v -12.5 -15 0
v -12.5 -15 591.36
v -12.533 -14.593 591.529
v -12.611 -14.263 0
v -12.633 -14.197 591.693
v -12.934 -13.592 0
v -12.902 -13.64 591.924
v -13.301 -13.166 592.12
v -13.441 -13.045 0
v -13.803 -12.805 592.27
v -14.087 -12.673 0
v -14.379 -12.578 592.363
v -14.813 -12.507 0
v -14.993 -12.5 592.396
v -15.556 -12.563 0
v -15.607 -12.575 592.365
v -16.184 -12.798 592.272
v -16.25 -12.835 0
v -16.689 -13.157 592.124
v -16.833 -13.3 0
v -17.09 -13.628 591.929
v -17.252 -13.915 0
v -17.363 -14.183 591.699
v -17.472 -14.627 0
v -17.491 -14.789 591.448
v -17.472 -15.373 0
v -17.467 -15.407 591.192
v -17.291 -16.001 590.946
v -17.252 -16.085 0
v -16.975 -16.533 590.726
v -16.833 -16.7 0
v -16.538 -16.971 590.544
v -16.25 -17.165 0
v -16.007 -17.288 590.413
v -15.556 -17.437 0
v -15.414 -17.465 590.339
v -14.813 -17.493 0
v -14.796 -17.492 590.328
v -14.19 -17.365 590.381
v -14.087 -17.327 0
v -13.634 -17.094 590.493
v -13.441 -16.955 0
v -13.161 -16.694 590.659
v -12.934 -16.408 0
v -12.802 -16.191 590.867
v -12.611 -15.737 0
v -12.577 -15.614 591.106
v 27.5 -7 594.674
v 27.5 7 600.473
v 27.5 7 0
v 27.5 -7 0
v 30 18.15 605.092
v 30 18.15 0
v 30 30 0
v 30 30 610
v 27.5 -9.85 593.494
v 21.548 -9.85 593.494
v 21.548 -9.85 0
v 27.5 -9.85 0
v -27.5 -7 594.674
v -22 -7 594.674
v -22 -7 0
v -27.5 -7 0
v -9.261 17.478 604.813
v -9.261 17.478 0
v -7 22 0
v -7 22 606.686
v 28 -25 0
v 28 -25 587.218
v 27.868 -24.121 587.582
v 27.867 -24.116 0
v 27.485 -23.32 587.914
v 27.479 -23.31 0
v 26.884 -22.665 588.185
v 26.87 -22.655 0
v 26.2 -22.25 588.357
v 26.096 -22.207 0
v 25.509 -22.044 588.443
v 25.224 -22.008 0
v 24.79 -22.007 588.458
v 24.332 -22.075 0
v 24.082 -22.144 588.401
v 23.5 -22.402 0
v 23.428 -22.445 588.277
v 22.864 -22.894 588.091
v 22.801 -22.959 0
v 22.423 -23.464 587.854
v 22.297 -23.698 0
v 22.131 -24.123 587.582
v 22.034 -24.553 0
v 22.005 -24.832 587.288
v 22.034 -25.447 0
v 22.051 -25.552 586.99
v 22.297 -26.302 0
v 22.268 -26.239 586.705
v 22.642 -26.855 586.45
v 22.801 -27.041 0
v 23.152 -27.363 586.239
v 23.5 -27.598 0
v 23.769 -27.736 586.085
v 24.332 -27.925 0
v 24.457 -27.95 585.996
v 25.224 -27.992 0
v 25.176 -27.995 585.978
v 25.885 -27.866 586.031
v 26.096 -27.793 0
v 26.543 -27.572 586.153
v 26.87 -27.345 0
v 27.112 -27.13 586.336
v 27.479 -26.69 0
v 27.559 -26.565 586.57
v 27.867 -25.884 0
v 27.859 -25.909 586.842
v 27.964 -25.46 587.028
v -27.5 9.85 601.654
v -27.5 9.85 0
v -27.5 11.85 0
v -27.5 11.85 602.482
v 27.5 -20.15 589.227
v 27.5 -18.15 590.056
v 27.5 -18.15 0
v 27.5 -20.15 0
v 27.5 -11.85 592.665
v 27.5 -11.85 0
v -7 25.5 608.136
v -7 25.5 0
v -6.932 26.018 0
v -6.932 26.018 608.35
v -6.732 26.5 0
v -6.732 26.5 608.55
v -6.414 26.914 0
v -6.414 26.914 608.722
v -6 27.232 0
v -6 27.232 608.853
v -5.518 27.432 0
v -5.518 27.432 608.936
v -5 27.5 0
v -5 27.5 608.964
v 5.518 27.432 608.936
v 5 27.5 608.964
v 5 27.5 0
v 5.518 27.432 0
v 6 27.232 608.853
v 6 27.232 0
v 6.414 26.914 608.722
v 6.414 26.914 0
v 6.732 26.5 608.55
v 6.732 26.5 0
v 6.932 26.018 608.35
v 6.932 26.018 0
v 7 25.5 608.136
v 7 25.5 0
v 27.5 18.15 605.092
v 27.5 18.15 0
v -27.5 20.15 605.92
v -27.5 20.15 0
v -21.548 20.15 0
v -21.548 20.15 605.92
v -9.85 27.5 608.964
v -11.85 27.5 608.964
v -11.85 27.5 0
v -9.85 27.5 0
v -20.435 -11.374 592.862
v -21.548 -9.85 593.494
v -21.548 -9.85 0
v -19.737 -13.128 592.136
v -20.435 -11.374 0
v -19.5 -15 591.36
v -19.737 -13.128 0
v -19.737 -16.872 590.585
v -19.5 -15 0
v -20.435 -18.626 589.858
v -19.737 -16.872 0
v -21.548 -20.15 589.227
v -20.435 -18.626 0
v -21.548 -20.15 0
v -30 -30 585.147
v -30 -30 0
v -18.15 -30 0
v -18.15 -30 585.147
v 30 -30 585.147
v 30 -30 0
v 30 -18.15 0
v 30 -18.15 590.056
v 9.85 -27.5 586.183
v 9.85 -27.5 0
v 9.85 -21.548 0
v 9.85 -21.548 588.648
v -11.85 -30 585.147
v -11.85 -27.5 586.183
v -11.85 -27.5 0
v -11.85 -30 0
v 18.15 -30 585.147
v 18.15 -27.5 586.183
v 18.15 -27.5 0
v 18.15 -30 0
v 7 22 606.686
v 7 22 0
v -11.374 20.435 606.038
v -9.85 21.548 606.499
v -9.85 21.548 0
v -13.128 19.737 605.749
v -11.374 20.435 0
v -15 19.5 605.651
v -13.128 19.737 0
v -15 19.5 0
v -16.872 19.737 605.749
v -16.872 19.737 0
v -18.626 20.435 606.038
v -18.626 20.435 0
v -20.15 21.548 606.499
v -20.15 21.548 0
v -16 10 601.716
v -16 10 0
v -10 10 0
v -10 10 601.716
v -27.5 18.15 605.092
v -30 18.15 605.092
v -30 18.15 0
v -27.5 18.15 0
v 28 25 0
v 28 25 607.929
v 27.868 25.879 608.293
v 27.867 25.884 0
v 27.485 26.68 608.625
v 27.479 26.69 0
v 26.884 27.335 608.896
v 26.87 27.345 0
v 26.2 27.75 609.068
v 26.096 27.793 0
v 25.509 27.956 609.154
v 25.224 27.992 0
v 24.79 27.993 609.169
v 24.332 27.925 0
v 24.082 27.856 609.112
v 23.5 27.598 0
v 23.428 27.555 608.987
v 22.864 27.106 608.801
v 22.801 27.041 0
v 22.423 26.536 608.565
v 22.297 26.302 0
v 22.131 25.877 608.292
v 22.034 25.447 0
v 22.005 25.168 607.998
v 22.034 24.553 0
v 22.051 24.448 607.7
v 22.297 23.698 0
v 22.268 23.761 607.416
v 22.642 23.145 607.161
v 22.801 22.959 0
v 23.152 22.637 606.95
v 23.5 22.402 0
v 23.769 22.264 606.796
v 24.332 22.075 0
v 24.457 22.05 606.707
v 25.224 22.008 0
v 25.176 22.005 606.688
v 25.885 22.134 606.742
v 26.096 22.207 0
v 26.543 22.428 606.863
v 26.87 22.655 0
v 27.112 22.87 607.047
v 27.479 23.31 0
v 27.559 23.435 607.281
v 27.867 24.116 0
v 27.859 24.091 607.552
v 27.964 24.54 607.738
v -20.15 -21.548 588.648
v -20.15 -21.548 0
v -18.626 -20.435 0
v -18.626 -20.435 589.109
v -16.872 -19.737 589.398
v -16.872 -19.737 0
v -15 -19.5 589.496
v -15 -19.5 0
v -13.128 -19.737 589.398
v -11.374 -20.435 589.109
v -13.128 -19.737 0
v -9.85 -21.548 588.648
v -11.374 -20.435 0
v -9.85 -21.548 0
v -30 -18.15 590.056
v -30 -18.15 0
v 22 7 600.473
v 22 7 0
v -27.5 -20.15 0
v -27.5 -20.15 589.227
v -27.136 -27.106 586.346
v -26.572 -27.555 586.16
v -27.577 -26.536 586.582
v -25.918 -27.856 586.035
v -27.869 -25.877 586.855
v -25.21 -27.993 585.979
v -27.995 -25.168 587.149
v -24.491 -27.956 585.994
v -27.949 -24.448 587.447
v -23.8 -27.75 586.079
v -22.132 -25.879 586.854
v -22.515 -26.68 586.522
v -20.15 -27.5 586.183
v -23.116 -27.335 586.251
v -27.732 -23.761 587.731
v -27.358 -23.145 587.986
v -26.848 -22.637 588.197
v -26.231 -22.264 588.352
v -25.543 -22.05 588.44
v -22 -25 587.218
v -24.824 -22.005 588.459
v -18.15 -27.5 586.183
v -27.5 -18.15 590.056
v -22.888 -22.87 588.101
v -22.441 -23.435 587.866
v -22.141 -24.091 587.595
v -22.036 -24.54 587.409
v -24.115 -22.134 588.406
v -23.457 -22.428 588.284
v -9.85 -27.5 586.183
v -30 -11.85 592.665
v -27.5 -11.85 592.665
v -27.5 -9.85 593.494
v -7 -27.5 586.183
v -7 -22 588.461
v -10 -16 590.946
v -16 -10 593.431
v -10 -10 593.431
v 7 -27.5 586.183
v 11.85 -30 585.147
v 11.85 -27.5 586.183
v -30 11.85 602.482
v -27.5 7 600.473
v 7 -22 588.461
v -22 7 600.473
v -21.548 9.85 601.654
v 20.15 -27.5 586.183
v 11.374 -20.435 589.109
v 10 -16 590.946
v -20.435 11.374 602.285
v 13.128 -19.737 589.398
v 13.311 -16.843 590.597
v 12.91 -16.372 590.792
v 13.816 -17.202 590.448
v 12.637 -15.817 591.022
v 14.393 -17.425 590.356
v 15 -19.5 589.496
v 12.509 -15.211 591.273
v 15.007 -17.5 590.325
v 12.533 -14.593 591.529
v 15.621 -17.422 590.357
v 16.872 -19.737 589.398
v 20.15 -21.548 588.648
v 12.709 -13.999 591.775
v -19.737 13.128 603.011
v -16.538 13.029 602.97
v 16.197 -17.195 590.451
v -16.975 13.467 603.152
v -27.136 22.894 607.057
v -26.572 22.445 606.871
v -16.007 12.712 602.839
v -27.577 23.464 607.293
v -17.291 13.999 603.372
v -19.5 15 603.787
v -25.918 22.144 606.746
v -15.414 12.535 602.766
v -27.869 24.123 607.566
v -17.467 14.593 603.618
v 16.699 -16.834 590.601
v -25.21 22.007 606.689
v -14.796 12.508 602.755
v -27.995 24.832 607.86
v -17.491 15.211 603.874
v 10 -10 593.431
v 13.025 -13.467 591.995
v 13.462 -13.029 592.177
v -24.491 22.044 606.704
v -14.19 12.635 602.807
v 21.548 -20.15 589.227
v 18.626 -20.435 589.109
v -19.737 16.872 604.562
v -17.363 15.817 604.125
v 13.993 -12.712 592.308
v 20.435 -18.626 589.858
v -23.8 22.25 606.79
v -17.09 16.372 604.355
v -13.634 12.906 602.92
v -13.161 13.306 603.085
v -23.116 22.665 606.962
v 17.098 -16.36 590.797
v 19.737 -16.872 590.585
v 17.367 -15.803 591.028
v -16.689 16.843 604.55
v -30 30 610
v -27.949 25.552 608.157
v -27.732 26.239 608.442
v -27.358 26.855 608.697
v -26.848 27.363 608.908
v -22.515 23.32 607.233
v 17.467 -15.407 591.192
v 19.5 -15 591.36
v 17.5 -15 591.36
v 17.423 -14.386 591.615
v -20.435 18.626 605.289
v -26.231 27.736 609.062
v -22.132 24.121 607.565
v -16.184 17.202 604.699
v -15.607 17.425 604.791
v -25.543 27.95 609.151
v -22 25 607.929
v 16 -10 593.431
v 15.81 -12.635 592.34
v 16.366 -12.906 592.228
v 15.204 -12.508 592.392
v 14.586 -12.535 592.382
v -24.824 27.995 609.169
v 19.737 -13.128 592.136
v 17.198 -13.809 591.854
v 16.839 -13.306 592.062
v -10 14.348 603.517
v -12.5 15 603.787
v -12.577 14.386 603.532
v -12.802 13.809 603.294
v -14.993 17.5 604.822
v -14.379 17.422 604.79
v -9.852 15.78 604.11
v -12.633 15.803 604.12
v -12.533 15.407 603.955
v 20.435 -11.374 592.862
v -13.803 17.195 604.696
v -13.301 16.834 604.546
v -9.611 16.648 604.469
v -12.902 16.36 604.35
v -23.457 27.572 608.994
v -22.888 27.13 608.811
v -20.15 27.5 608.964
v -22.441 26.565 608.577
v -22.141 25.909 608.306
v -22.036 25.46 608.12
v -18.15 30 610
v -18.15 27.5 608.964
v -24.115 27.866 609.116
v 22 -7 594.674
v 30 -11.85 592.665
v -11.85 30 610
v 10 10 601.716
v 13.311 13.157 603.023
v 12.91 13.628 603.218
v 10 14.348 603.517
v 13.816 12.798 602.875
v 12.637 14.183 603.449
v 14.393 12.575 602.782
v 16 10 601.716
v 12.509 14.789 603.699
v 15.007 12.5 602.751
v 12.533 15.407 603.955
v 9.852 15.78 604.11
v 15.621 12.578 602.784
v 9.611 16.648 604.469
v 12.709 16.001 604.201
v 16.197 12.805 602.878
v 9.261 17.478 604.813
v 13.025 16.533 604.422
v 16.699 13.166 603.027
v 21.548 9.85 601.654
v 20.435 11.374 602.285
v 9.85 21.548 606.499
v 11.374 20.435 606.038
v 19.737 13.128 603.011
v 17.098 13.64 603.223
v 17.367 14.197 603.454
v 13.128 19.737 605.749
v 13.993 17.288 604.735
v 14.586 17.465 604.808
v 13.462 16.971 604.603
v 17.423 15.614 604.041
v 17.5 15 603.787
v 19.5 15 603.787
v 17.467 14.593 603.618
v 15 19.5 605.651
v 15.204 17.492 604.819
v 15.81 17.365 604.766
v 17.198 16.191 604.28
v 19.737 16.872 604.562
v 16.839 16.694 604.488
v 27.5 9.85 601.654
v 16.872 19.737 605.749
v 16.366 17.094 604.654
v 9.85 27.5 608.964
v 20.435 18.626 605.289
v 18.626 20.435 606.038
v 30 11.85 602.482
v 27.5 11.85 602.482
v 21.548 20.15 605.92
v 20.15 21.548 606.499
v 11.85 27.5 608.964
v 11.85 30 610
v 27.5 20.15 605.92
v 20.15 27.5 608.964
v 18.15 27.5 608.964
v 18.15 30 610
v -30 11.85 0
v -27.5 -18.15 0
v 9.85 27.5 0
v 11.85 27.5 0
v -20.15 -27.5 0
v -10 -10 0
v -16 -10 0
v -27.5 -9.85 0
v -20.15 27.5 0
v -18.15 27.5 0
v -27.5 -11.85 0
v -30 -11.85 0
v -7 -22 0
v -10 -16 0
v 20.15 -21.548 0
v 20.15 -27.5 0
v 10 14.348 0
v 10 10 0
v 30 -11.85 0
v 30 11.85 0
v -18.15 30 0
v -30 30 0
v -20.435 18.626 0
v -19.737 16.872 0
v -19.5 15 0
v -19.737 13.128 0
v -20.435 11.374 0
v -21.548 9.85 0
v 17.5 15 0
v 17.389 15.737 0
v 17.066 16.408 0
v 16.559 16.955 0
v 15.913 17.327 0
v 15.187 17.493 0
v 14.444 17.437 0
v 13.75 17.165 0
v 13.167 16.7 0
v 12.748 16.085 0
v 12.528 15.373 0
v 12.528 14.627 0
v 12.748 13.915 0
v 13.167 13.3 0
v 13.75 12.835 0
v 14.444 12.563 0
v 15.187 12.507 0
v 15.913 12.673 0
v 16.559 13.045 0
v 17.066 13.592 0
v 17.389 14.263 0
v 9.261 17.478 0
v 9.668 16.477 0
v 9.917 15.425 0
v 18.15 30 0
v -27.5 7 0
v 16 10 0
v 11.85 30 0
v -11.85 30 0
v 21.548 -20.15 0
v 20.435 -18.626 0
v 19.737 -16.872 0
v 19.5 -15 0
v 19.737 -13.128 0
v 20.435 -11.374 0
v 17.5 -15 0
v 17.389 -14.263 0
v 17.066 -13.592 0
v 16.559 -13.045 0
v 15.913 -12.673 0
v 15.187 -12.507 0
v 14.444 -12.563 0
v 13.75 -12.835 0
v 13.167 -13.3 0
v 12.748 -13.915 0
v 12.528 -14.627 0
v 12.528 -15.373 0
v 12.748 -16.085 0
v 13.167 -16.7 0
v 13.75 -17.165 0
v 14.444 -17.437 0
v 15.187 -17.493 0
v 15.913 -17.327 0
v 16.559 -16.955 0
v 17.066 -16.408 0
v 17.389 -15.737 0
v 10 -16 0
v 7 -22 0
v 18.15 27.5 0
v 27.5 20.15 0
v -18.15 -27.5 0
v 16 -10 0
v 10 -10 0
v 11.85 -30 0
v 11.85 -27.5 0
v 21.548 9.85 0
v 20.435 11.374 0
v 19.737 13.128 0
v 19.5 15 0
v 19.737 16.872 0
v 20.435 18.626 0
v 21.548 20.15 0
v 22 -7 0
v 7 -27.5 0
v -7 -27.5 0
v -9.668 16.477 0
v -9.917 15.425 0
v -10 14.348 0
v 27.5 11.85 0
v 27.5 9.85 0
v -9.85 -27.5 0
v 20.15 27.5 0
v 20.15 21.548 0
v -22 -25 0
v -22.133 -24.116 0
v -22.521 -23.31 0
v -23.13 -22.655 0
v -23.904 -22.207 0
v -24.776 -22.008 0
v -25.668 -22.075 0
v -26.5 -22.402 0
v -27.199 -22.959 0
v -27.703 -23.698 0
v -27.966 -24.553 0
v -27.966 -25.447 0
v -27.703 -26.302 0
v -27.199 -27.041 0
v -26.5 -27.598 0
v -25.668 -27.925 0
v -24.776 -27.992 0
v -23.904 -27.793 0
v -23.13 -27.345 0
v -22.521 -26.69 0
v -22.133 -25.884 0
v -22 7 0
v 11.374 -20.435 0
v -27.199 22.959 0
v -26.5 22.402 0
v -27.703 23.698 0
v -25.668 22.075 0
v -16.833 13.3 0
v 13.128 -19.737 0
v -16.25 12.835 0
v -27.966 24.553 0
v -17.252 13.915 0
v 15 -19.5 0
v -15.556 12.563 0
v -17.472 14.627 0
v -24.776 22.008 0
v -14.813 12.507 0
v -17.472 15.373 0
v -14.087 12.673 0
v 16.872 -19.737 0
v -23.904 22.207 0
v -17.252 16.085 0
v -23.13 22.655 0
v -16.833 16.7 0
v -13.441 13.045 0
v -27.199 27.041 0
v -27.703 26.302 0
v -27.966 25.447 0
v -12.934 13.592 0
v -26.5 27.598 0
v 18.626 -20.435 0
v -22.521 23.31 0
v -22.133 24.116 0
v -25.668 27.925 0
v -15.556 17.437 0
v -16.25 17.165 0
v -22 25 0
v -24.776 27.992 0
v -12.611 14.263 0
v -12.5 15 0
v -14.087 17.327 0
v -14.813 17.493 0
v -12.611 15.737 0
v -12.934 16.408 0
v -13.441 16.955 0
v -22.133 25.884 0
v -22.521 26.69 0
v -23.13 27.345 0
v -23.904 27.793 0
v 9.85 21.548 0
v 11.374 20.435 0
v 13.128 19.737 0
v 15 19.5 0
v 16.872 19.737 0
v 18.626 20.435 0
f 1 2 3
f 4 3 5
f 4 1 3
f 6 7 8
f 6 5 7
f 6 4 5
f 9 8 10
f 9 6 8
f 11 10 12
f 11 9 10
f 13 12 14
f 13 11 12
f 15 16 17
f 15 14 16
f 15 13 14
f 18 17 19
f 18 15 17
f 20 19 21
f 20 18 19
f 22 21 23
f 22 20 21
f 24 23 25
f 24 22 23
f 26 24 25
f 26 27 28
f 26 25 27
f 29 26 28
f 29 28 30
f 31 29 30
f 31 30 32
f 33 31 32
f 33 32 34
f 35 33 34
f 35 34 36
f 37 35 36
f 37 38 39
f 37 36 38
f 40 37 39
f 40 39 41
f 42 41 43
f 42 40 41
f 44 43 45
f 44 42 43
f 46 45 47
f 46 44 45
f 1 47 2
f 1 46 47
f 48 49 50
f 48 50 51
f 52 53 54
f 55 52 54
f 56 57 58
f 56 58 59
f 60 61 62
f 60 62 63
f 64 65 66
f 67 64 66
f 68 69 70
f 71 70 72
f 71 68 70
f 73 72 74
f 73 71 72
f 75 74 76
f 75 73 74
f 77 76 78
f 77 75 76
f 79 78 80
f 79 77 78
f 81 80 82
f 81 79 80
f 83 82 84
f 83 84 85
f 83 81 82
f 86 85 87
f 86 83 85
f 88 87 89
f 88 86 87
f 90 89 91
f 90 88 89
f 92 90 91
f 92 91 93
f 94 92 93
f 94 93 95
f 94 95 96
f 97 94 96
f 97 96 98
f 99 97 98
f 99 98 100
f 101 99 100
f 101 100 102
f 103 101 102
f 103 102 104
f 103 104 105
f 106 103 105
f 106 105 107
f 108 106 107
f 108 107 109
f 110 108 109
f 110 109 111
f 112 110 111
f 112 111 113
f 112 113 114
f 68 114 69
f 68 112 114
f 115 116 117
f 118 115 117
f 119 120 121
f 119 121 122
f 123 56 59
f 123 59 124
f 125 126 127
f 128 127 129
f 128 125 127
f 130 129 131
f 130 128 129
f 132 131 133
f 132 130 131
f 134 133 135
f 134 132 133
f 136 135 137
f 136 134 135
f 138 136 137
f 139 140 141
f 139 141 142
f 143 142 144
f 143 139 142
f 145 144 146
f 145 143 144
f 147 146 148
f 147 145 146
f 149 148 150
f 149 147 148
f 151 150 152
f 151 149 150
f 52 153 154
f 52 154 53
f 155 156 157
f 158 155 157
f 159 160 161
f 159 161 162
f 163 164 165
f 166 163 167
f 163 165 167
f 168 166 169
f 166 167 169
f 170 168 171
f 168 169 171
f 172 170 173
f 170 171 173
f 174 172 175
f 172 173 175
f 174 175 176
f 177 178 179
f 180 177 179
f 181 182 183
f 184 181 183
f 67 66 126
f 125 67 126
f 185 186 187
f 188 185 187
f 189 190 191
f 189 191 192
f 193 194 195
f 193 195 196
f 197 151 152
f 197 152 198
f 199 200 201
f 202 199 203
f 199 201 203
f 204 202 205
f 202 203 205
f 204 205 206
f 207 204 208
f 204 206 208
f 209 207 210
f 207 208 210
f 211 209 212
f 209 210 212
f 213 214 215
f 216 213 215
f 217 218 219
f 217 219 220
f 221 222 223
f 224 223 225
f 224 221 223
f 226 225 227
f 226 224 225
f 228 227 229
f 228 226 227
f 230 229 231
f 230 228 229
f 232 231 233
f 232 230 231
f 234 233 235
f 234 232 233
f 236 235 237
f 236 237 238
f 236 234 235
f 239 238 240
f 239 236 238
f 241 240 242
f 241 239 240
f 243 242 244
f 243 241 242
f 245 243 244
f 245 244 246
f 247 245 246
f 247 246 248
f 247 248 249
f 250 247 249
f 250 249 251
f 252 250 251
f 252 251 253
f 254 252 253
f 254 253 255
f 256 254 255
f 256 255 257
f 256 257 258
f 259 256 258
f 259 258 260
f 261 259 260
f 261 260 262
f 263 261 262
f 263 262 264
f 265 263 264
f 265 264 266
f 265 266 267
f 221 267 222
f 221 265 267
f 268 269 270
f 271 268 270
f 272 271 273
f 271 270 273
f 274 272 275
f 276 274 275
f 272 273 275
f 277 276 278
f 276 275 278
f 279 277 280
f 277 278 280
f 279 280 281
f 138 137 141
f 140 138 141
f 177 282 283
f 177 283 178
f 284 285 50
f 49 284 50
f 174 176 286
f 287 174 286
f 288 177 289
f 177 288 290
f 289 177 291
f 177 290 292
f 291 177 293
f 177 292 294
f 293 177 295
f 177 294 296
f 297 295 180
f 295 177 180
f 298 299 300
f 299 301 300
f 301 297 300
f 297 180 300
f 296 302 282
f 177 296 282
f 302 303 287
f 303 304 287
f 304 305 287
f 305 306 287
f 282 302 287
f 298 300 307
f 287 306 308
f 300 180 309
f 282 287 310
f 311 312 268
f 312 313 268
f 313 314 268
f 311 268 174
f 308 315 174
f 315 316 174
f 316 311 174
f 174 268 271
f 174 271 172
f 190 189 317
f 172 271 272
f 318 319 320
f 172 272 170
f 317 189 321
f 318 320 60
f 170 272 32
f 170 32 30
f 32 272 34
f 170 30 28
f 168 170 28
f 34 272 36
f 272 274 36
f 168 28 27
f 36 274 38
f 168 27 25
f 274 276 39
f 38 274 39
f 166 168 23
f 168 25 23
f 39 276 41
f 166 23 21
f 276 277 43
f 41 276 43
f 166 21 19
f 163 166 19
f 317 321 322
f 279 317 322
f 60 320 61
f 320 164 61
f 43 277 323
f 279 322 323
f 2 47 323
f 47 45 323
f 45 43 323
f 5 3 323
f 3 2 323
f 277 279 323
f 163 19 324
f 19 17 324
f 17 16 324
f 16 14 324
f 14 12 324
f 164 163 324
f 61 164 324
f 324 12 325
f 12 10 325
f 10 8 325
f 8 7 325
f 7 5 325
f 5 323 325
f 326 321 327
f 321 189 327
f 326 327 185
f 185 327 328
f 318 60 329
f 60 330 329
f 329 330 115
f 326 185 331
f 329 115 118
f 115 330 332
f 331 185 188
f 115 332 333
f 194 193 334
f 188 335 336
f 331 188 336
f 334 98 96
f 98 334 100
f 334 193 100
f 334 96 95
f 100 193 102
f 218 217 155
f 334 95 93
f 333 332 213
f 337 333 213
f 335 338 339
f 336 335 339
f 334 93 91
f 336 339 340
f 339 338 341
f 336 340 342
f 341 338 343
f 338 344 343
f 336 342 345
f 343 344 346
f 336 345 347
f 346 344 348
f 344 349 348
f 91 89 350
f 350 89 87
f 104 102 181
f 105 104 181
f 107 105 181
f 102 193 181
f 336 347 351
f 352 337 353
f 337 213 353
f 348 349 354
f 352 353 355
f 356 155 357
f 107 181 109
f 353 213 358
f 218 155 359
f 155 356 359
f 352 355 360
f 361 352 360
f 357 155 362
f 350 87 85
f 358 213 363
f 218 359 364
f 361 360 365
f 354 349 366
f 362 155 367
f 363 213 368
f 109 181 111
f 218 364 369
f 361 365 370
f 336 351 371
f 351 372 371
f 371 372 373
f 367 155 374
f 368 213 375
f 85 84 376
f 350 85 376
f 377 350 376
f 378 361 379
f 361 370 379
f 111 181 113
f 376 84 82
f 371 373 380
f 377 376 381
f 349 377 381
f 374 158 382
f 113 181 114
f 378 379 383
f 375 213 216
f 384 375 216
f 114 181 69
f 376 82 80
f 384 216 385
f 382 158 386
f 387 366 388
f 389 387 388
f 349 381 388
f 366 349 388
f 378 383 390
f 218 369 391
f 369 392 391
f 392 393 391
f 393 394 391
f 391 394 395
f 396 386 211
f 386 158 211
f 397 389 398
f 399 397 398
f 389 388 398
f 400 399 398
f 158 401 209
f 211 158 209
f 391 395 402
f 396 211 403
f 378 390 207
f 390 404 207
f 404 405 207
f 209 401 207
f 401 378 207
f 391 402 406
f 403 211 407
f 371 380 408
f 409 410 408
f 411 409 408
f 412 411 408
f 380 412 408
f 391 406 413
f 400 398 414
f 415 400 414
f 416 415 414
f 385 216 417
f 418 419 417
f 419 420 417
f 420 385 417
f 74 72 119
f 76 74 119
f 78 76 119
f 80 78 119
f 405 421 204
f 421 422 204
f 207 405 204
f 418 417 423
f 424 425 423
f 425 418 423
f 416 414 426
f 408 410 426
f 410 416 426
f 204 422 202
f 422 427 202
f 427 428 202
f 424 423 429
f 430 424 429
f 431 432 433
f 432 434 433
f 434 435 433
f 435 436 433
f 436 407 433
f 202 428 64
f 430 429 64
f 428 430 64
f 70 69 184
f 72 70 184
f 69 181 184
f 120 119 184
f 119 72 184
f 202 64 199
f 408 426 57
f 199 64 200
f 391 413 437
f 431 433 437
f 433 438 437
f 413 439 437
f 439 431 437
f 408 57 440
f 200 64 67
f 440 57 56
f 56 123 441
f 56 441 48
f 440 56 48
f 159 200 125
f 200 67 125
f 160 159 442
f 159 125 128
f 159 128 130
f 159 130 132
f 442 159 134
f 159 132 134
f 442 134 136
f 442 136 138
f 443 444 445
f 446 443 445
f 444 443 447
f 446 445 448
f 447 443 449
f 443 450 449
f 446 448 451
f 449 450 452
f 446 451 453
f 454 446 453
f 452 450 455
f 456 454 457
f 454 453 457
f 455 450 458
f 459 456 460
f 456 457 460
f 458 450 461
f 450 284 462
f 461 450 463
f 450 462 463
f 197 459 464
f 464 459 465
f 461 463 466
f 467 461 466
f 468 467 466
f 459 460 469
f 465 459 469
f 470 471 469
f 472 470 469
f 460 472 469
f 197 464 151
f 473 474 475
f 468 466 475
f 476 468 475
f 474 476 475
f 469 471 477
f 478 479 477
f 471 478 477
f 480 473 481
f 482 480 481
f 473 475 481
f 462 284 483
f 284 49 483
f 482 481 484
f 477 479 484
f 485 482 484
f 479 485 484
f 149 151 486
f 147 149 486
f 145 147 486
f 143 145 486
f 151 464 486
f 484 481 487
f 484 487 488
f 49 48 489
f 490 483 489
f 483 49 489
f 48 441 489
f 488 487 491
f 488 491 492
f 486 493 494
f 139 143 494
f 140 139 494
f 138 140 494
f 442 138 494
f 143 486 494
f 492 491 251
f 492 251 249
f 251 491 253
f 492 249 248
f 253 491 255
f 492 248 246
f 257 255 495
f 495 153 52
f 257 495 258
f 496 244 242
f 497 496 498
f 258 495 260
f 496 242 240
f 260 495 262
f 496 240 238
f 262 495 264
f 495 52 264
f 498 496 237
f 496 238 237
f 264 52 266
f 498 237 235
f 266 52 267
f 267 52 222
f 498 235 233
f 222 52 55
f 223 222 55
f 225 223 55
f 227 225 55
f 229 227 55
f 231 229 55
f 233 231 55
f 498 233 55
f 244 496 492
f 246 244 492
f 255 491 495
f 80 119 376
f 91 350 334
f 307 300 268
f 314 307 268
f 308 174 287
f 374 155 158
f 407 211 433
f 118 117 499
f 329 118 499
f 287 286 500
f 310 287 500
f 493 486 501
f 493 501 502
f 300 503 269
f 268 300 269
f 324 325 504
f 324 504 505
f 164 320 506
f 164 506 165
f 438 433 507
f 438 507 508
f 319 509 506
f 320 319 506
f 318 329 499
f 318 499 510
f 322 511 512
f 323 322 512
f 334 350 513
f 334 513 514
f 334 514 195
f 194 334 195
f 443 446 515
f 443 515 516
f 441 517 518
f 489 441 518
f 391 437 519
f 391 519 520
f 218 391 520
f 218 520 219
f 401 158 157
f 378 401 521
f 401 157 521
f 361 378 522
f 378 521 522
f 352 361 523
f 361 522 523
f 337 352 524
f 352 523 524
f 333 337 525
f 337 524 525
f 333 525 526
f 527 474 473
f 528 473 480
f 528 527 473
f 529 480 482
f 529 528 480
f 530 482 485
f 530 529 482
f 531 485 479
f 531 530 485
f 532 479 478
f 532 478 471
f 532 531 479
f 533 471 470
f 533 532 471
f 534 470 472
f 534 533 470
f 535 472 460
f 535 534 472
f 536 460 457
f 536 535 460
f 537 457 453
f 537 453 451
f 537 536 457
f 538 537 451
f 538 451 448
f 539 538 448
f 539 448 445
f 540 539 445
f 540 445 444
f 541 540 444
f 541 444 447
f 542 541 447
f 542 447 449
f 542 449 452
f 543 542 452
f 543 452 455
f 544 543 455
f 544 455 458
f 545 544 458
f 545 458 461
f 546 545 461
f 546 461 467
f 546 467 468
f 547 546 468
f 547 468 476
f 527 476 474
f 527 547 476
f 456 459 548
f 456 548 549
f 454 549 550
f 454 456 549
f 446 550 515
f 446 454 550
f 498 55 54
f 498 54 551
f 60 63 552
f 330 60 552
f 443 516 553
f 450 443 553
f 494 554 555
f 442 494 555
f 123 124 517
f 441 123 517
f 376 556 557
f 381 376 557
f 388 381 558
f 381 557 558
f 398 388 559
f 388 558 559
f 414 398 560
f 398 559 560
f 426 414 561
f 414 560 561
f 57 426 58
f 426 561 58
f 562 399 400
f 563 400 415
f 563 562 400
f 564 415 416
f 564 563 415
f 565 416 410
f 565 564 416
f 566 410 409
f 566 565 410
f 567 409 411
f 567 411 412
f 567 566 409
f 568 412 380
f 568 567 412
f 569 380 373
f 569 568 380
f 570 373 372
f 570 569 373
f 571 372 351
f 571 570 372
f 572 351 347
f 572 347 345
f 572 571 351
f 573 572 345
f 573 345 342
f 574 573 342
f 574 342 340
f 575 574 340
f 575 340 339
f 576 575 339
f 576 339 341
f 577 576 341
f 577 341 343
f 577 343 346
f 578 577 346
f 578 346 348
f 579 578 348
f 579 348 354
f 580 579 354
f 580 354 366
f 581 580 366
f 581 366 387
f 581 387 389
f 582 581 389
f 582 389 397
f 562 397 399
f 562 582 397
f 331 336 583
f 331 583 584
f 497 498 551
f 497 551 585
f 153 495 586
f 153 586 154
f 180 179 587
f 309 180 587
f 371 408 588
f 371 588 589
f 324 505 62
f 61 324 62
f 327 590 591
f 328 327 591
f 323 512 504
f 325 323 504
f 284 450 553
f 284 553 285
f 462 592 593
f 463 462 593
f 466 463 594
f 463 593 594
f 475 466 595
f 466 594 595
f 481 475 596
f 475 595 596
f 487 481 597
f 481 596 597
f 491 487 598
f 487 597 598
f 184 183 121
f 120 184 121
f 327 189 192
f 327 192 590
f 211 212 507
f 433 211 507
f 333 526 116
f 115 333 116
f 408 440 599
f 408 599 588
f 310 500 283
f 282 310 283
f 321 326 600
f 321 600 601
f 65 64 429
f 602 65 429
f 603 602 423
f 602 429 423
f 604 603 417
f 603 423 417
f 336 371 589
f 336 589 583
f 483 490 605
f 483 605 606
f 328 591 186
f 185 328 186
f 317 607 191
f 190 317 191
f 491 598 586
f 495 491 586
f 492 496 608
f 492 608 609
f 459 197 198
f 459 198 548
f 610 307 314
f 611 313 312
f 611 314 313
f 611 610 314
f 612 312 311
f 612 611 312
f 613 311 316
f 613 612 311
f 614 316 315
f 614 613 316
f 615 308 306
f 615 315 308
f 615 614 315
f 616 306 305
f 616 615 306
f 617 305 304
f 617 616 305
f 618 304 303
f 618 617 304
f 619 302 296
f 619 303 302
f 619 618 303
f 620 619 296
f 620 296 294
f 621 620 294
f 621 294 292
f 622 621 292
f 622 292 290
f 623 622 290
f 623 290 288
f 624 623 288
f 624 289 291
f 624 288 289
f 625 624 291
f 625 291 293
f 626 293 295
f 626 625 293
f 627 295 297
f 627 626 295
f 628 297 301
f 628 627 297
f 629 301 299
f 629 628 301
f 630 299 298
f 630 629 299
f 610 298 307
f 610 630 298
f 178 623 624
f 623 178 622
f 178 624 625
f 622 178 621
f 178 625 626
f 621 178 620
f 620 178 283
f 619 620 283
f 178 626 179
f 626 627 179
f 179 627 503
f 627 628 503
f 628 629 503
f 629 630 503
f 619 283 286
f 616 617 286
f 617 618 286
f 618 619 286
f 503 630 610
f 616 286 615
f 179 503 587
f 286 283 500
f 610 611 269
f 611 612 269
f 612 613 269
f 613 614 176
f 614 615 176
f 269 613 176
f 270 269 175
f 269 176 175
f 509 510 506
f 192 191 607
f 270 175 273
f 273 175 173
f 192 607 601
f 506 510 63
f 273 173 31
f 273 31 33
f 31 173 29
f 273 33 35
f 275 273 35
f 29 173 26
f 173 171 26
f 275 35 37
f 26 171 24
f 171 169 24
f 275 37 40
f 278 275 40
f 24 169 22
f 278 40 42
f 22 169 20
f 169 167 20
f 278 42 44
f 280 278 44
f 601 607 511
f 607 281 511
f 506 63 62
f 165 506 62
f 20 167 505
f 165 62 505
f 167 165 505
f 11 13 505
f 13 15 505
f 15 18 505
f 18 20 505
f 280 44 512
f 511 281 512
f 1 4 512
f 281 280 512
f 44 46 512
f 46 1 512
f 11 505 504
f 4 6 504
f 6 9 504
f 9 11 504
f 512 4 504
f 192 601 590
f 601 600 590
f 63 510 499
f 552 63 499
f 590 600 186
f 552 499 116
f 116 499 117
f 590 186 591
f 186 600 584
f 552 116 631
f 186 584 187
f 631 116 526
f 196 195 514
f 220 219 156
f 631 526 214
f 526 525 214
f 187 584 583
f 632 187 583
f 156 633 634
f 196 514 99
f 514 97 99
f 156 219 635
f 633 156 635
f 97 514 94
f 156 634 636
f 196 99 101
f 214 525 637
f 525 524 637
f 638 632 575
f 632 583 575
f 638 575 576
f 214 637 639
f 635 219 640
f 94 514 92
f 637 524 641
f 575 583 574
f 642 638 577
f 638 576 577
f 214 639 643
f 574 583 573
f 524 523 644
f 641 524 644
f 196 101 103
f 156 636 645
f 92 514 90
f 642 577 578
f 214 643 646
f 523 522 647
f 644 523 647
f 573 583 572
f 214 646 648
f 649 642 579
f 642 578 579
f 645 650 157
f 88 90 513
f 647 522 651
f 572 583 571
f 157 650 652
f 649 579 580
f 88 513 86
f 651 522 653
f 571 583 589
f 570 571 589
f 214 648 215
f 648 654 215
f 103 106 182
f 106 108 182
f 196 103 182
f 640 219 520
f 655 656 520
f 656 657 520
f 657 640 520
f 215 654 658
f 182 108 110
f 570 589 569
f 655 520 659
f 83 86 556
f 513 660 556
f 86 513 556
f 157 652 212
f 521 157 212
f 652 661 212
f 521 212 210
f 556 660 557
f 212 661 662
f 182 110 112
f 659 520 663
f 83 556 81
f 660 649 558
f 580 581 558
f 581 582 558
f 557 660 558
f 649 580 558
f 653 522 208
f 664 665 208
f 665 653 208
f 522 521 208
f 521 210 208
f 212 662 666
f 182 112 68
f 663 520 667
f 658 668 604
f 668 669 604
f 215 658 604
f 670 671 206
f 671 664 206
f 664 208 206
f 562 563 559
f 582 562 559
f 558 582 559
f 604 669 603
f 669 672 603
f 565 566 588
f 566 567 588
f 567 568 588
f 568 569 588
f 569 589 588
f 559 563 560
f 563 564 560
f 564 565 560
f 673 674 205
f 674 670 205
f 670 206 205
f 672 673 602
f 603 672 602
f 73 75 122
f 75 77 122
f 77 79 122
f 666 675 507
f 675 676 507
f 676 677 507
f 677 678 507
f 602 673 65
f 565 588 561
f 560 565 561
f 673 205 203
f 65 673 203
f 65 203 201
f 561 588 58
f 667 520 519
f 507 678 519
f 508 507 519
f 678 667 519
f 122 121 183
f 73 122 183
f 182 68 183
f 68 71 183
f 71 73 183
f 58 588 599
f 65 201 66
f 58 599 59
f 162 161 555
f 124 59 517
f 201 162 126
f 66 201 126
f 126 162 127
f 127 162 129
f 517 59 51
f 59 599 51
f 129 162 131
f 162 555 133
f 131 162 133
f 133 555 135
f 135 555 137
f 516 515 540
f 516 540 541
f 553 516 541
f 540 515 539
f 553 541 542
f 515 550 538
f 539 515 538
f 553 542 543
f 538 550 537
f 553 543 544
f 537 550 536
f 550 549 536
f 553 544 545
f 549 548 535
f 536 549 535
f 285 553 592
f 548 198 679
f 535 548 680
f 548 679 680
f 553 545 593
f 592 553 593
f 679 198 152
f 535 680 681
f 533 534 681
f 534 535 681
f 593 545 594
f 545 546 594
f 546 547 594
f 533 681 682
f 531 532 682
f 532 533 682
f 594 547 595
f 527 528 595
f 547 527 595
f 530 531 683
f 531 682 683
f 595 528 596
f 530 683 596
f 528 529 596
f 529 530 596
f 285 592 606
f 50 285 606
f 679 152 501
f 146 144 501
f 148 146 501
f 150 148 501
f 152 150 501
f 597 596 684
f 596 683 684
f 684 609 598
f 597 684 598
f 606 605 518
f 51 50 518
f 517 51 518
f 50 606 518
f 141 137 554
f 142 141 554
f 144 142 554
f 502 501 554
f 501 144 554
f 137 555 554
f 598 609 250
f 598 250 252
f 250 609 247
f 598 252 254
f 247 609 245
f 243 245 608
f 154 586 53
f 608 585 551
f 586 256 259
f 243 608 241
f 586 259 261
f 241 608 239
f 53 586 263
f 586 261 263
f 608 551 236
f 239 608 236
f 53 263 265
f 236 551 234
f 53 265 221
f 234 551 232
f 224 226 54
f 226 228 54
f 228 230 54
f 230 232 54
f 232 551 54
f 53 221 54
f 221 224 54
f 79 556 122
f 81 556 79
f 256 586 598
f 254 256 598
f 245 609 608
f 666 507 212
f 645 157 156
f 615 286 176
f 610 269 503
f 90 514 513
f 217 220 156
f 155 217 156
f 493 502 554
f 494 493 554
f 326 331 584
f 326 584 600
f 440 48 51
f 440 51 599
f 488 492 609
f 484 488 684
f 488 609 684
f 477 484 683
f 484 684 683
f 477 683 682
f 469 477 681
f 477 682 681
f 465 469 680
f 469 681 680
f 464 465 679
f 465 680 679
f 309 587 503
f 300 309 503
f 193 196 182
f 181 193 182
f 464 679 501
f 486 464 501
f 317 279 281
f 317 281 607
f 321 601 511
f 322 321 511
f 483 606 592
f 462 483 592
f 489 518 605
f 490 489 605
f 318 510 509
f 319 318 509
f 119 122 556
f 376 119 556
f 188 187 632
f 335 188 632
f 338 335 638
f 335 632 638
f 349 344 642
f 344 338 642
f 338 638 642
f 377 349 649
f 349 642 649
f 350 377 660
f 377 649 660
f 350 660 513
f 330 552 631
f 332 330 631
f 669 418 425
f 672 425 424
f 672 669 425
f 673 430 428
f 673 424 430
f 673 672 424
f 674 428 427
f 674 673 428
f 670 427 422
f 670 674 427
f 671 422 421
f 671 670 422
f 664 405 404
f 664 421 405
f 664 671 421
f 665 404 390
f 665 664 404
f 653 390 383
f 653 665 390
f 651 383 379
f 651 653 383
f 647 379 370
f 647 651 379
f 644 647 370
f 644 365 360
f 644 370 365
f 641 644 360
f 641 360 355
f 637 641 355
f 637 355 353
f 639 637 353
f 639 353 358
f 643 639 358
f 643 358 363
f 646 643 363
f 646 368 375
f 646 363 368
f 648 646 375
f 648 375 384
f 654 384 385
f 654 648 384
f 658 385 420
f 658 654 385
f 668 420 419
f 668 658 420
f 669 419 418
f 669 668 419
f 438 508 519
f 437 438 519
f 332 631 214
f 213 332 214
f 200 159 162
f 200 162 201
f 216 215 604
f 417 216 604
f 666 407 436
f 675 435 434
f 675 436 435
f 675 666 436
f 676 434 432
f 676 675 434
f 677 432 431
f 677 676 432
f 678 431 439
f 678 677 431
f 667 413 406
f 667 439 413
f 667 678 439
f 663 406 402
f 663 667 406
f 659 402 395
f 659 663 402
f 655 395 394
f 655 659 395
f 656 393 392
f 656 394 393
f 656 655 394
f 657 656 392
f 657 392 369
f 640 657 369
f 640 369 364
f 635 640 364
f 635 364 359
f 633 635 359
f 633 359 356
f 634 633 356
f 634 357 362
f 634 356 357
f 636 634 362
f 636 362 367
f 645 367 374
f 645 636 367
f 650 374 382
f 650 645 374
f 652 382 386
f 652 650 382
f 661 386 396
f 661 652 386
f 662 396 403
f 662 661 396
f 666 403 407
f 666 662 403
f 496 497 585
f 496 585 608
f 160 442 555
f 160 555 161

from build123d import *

# Parameters (mm, degrees)
F0_R          = 3
F0_R_2        = 2.5
F1_DEPTH      = 610
F2_R          = 2
F3_R          = 7
F5_DEPTH      = 30
F5_DEPTH_BACK = 30


# Not quite as in the source:
# - a feature names something its author has since deleted; it is built from what else it names


with BuildPart() as f1:
    # F0 (on Top) → F1 (new body)
    with BuildSketch(Plane.XY):
        with BuildLine():
            Line((18.15, -30), (30, -30))
            Line((30, -30), (30, -18.15))
            Line((30, -18.15), (27.5, -18.15))
            Line((27.5, -18.15), (27.5, -20.15))
            Line((27.5, -20.15), (21.5477069044, -20.15))
            ThreePointArc((21.5477069044, -20.15), (19.5, -15), (21.5477069044, -9.85))
            Line((21.5477069044, -9.85), (27.5, -9.85))
            Line((27.5, -9.85), (27.5, -11.85))
            Line((27.5, -11.85), (30, -11.85))
            Line((30, -11.85), (30, 11.85))
            Line((30, 11.85), (27.5, 11.85))
            Line((27.5, 11.85), (27.5, 9.85))
            Line((27.5, 9.85), (21.5477069044, 9.85))
            ThreePointArc((21.5477069044, 9.85), (19.5, 15), (21.5477069044, 20.15))
            Line((21.5477069044, 20.15), (27.5, 20.15))
            Line((27.5, 20.15), (27.5, 18.15))
            Line((27.5, 18.15), (30, 18.15))
            Line((30, 18.15), (30, 30))
            Line((30, 30), (18.15, 30))
            Line((18.15, 30), (18.15, 27.5))
            Line((18.15, 27.5), (20.15, 27.5))
            Line((20.15, 27.5), (20.15, 21.5477069044))
            ThreePointArc((20.15, 21.5477069044), (15, 19.5), (9.85, 21.5477069044))
            Line((9.85, 21.5477069044), (9.85, 27.5))
            Line((9.85, 27.5), (11.85, 27.5))
            Line((11.85, 27.5), (11.85, 30))
            Line((11.85, 30), (-11.85, 30))
            Line((-11.85, 30), (-11.85, 27.5))
            Line((-11.85, 27.5), (-9.85, 27.5))
            Line((-9.85, 27.5), (-9.85, 21.5477069044))
            ThreePointArc((-9.85, 21.5477069044), (-15, 19.5), (-20.15, 21.5477069044))
            Line((-20.15, 21.5477069044), (-20.15, 27.5))
            Line((-20.15, 27.5), (-18.15, 27.5))
            Line((-18.15, 27.5), (-18.15, 30))
            Line((-18.15, 30), (-30, 30))
            Line((-30, 30), (-30, 18.15))
            Line((-30, 18.15), (-27.5, 18.15))
            Line((-27.5, 18.15), (-27.5, 20.15))
            Line((-27.5, 20.15), (-21.5477069044, 20.15))
            ThreePointArc((-21.5477069044, 20.15), (-19.5, 15), (-21.5477069044, 9.85))
            Line((-21.5477069044, 9.85), (-27.5, 9.85))
            Line((-27.5, 9.85), (-27.5, 11.85))
            Line((-27.5, 11.85), (-30, 11.85))
            Line((-30, 11.85), (-30, -11.85))
            Line((-30, -11.85), (-27.5, -11.85))
            Line((-27.5, -11.85), (-27.5, -9.85))
            Line((-27.5, -9.85), (-21.5477069044, -9.85))
            ThreePointArc((-21.5477069044, -9.85), (-19.5, -15), (-21.5477069044, -20.15))
            Line((-21.5477069044, -20.15), (-27.5, -20.15))
            Line((-27.5, -20.15), (-27.5, -18.15))
            Line((-27.5, -18.15), (-30, -18.15))
            Line((-30, -18.15), (-30, -30))
            Line((-30, -30), (-18.15, -30))
            Line((-18.15, -30), (-18.15, -27.5))
            Line((-18.15, -27.5), (-20.15, -27.5))
            Line((-20.15, -27.5), (-20.15, -21.5477069044))
            ThreePointArc((-20.15, -21.5477069044), (-15, -19.5), (-9.85, -21.5477069044))
            Line((-9.85, -21.5477069044), (-9.85, -27.5))
            Line((-9.85, -27.5), (-11.85, -27.5))
            Line((-11.85, -27.5), (-11.85, -30))
            Line((-11.85, -30), (11.85, -30))
            Line((11.85, -30), (11.85, -27.5))
            Line((11.85, -27.5), (9.85, -27.5))
            Line((9.85, -27.5), (9.85, -21.5477069044))
            ThreePointArc((9.85, -21.5477069044), (15, -19.5), (20.15, -21.5477069044))
            Line((20.15, -21.5477069044), (20.15, -27.5))
            Line((20.15, -27.5), (18.15, -27.5))
            Line((18.15, -27.5), (18.15, -30))
        make_face()
        with Locations((-25, -25)):
            Circle(F0_R, mode=Mode.SUBTRACT)
        with Locations((-15, -15)):
            Circle(F0_R_2, mode=Mode.SUBTRACT)
        with Locations((25, -25)):
            Circle(F0_R, mode=Mode.SUBTRACT)
        with Locations((15, -15)):
            Circle(F0_R_2, mode=Mode.SUBTRACT)
        with Locations((-25, 25)):
            Circle(F0_R, mode=Mode.SUBTRACT)
        with Locations((-15, 15)):
            Circle(F0_R_2, mode=Mode.SUBTRACT)
        Polygon((-7, 22), (-7, 27.5), (0, 27.5), (7, 27.5), (7, 22), (10, 16), (10, 10), (16, 10), (22, 7), (27.5, 7), (27.5, 0), (27.5, -7), (22, -7), (16, -10), (10, -10), (10, -16), (7, -22), (7, -27.5), (0, -27.5), (-7, -27.5), (-7, -22), (-10, -16), (-10, -10), (-16, -10), (-22, -7), (-27.5, -7), (-27.5, 0), (-27.5, 7), (-22, 7), (-16, 10), (-10, 10), (-10, 16), align=None, mode=Mode.SUBTRACT)
        with Locations((15, 15)):
            Circle(F0_R_2, mode=Mode.SUBTRACT)
        with Locations((25, 25)):
            Circle(F0_R, mode=Mode.SUBTRACT)
    extrude(amount=F1_DEPTH)

    # F2
    f2_edges = [f1.edges().sort_by_distance(p)[0] for p in [
        (-7, 27.5, 305),
        (7, 27.5, 305),
    ]]
    fillet(f2_edges, radius=F2_R)

    # F3
    f3_edges = [f1.edges().sort_by_distance(p)[0] for p in [
        (-10, 16, 305),
        (10, 16, 305),
    ]]
    fillet(f3_edges, radius=F3_R)

    # F4 (on Right) → F5 (cut, two sides)
    with BuildSketch(Plane.YZ) as f5_sk:
        Polygon((-66.9285170742, 844.0061405012), (-249.6042822322, 768.3393610558), (-152.6757651581, 534.3332205546), (30, 610), align=None)
    extrude(amount=F5_DEPTH, mode=Mode.SUBTRACT)
    extrude(f5_sk.sketch, amount=-F5_DEPTH_BACK, mode=Mode.SUBTRACT)


solid = f1.part
